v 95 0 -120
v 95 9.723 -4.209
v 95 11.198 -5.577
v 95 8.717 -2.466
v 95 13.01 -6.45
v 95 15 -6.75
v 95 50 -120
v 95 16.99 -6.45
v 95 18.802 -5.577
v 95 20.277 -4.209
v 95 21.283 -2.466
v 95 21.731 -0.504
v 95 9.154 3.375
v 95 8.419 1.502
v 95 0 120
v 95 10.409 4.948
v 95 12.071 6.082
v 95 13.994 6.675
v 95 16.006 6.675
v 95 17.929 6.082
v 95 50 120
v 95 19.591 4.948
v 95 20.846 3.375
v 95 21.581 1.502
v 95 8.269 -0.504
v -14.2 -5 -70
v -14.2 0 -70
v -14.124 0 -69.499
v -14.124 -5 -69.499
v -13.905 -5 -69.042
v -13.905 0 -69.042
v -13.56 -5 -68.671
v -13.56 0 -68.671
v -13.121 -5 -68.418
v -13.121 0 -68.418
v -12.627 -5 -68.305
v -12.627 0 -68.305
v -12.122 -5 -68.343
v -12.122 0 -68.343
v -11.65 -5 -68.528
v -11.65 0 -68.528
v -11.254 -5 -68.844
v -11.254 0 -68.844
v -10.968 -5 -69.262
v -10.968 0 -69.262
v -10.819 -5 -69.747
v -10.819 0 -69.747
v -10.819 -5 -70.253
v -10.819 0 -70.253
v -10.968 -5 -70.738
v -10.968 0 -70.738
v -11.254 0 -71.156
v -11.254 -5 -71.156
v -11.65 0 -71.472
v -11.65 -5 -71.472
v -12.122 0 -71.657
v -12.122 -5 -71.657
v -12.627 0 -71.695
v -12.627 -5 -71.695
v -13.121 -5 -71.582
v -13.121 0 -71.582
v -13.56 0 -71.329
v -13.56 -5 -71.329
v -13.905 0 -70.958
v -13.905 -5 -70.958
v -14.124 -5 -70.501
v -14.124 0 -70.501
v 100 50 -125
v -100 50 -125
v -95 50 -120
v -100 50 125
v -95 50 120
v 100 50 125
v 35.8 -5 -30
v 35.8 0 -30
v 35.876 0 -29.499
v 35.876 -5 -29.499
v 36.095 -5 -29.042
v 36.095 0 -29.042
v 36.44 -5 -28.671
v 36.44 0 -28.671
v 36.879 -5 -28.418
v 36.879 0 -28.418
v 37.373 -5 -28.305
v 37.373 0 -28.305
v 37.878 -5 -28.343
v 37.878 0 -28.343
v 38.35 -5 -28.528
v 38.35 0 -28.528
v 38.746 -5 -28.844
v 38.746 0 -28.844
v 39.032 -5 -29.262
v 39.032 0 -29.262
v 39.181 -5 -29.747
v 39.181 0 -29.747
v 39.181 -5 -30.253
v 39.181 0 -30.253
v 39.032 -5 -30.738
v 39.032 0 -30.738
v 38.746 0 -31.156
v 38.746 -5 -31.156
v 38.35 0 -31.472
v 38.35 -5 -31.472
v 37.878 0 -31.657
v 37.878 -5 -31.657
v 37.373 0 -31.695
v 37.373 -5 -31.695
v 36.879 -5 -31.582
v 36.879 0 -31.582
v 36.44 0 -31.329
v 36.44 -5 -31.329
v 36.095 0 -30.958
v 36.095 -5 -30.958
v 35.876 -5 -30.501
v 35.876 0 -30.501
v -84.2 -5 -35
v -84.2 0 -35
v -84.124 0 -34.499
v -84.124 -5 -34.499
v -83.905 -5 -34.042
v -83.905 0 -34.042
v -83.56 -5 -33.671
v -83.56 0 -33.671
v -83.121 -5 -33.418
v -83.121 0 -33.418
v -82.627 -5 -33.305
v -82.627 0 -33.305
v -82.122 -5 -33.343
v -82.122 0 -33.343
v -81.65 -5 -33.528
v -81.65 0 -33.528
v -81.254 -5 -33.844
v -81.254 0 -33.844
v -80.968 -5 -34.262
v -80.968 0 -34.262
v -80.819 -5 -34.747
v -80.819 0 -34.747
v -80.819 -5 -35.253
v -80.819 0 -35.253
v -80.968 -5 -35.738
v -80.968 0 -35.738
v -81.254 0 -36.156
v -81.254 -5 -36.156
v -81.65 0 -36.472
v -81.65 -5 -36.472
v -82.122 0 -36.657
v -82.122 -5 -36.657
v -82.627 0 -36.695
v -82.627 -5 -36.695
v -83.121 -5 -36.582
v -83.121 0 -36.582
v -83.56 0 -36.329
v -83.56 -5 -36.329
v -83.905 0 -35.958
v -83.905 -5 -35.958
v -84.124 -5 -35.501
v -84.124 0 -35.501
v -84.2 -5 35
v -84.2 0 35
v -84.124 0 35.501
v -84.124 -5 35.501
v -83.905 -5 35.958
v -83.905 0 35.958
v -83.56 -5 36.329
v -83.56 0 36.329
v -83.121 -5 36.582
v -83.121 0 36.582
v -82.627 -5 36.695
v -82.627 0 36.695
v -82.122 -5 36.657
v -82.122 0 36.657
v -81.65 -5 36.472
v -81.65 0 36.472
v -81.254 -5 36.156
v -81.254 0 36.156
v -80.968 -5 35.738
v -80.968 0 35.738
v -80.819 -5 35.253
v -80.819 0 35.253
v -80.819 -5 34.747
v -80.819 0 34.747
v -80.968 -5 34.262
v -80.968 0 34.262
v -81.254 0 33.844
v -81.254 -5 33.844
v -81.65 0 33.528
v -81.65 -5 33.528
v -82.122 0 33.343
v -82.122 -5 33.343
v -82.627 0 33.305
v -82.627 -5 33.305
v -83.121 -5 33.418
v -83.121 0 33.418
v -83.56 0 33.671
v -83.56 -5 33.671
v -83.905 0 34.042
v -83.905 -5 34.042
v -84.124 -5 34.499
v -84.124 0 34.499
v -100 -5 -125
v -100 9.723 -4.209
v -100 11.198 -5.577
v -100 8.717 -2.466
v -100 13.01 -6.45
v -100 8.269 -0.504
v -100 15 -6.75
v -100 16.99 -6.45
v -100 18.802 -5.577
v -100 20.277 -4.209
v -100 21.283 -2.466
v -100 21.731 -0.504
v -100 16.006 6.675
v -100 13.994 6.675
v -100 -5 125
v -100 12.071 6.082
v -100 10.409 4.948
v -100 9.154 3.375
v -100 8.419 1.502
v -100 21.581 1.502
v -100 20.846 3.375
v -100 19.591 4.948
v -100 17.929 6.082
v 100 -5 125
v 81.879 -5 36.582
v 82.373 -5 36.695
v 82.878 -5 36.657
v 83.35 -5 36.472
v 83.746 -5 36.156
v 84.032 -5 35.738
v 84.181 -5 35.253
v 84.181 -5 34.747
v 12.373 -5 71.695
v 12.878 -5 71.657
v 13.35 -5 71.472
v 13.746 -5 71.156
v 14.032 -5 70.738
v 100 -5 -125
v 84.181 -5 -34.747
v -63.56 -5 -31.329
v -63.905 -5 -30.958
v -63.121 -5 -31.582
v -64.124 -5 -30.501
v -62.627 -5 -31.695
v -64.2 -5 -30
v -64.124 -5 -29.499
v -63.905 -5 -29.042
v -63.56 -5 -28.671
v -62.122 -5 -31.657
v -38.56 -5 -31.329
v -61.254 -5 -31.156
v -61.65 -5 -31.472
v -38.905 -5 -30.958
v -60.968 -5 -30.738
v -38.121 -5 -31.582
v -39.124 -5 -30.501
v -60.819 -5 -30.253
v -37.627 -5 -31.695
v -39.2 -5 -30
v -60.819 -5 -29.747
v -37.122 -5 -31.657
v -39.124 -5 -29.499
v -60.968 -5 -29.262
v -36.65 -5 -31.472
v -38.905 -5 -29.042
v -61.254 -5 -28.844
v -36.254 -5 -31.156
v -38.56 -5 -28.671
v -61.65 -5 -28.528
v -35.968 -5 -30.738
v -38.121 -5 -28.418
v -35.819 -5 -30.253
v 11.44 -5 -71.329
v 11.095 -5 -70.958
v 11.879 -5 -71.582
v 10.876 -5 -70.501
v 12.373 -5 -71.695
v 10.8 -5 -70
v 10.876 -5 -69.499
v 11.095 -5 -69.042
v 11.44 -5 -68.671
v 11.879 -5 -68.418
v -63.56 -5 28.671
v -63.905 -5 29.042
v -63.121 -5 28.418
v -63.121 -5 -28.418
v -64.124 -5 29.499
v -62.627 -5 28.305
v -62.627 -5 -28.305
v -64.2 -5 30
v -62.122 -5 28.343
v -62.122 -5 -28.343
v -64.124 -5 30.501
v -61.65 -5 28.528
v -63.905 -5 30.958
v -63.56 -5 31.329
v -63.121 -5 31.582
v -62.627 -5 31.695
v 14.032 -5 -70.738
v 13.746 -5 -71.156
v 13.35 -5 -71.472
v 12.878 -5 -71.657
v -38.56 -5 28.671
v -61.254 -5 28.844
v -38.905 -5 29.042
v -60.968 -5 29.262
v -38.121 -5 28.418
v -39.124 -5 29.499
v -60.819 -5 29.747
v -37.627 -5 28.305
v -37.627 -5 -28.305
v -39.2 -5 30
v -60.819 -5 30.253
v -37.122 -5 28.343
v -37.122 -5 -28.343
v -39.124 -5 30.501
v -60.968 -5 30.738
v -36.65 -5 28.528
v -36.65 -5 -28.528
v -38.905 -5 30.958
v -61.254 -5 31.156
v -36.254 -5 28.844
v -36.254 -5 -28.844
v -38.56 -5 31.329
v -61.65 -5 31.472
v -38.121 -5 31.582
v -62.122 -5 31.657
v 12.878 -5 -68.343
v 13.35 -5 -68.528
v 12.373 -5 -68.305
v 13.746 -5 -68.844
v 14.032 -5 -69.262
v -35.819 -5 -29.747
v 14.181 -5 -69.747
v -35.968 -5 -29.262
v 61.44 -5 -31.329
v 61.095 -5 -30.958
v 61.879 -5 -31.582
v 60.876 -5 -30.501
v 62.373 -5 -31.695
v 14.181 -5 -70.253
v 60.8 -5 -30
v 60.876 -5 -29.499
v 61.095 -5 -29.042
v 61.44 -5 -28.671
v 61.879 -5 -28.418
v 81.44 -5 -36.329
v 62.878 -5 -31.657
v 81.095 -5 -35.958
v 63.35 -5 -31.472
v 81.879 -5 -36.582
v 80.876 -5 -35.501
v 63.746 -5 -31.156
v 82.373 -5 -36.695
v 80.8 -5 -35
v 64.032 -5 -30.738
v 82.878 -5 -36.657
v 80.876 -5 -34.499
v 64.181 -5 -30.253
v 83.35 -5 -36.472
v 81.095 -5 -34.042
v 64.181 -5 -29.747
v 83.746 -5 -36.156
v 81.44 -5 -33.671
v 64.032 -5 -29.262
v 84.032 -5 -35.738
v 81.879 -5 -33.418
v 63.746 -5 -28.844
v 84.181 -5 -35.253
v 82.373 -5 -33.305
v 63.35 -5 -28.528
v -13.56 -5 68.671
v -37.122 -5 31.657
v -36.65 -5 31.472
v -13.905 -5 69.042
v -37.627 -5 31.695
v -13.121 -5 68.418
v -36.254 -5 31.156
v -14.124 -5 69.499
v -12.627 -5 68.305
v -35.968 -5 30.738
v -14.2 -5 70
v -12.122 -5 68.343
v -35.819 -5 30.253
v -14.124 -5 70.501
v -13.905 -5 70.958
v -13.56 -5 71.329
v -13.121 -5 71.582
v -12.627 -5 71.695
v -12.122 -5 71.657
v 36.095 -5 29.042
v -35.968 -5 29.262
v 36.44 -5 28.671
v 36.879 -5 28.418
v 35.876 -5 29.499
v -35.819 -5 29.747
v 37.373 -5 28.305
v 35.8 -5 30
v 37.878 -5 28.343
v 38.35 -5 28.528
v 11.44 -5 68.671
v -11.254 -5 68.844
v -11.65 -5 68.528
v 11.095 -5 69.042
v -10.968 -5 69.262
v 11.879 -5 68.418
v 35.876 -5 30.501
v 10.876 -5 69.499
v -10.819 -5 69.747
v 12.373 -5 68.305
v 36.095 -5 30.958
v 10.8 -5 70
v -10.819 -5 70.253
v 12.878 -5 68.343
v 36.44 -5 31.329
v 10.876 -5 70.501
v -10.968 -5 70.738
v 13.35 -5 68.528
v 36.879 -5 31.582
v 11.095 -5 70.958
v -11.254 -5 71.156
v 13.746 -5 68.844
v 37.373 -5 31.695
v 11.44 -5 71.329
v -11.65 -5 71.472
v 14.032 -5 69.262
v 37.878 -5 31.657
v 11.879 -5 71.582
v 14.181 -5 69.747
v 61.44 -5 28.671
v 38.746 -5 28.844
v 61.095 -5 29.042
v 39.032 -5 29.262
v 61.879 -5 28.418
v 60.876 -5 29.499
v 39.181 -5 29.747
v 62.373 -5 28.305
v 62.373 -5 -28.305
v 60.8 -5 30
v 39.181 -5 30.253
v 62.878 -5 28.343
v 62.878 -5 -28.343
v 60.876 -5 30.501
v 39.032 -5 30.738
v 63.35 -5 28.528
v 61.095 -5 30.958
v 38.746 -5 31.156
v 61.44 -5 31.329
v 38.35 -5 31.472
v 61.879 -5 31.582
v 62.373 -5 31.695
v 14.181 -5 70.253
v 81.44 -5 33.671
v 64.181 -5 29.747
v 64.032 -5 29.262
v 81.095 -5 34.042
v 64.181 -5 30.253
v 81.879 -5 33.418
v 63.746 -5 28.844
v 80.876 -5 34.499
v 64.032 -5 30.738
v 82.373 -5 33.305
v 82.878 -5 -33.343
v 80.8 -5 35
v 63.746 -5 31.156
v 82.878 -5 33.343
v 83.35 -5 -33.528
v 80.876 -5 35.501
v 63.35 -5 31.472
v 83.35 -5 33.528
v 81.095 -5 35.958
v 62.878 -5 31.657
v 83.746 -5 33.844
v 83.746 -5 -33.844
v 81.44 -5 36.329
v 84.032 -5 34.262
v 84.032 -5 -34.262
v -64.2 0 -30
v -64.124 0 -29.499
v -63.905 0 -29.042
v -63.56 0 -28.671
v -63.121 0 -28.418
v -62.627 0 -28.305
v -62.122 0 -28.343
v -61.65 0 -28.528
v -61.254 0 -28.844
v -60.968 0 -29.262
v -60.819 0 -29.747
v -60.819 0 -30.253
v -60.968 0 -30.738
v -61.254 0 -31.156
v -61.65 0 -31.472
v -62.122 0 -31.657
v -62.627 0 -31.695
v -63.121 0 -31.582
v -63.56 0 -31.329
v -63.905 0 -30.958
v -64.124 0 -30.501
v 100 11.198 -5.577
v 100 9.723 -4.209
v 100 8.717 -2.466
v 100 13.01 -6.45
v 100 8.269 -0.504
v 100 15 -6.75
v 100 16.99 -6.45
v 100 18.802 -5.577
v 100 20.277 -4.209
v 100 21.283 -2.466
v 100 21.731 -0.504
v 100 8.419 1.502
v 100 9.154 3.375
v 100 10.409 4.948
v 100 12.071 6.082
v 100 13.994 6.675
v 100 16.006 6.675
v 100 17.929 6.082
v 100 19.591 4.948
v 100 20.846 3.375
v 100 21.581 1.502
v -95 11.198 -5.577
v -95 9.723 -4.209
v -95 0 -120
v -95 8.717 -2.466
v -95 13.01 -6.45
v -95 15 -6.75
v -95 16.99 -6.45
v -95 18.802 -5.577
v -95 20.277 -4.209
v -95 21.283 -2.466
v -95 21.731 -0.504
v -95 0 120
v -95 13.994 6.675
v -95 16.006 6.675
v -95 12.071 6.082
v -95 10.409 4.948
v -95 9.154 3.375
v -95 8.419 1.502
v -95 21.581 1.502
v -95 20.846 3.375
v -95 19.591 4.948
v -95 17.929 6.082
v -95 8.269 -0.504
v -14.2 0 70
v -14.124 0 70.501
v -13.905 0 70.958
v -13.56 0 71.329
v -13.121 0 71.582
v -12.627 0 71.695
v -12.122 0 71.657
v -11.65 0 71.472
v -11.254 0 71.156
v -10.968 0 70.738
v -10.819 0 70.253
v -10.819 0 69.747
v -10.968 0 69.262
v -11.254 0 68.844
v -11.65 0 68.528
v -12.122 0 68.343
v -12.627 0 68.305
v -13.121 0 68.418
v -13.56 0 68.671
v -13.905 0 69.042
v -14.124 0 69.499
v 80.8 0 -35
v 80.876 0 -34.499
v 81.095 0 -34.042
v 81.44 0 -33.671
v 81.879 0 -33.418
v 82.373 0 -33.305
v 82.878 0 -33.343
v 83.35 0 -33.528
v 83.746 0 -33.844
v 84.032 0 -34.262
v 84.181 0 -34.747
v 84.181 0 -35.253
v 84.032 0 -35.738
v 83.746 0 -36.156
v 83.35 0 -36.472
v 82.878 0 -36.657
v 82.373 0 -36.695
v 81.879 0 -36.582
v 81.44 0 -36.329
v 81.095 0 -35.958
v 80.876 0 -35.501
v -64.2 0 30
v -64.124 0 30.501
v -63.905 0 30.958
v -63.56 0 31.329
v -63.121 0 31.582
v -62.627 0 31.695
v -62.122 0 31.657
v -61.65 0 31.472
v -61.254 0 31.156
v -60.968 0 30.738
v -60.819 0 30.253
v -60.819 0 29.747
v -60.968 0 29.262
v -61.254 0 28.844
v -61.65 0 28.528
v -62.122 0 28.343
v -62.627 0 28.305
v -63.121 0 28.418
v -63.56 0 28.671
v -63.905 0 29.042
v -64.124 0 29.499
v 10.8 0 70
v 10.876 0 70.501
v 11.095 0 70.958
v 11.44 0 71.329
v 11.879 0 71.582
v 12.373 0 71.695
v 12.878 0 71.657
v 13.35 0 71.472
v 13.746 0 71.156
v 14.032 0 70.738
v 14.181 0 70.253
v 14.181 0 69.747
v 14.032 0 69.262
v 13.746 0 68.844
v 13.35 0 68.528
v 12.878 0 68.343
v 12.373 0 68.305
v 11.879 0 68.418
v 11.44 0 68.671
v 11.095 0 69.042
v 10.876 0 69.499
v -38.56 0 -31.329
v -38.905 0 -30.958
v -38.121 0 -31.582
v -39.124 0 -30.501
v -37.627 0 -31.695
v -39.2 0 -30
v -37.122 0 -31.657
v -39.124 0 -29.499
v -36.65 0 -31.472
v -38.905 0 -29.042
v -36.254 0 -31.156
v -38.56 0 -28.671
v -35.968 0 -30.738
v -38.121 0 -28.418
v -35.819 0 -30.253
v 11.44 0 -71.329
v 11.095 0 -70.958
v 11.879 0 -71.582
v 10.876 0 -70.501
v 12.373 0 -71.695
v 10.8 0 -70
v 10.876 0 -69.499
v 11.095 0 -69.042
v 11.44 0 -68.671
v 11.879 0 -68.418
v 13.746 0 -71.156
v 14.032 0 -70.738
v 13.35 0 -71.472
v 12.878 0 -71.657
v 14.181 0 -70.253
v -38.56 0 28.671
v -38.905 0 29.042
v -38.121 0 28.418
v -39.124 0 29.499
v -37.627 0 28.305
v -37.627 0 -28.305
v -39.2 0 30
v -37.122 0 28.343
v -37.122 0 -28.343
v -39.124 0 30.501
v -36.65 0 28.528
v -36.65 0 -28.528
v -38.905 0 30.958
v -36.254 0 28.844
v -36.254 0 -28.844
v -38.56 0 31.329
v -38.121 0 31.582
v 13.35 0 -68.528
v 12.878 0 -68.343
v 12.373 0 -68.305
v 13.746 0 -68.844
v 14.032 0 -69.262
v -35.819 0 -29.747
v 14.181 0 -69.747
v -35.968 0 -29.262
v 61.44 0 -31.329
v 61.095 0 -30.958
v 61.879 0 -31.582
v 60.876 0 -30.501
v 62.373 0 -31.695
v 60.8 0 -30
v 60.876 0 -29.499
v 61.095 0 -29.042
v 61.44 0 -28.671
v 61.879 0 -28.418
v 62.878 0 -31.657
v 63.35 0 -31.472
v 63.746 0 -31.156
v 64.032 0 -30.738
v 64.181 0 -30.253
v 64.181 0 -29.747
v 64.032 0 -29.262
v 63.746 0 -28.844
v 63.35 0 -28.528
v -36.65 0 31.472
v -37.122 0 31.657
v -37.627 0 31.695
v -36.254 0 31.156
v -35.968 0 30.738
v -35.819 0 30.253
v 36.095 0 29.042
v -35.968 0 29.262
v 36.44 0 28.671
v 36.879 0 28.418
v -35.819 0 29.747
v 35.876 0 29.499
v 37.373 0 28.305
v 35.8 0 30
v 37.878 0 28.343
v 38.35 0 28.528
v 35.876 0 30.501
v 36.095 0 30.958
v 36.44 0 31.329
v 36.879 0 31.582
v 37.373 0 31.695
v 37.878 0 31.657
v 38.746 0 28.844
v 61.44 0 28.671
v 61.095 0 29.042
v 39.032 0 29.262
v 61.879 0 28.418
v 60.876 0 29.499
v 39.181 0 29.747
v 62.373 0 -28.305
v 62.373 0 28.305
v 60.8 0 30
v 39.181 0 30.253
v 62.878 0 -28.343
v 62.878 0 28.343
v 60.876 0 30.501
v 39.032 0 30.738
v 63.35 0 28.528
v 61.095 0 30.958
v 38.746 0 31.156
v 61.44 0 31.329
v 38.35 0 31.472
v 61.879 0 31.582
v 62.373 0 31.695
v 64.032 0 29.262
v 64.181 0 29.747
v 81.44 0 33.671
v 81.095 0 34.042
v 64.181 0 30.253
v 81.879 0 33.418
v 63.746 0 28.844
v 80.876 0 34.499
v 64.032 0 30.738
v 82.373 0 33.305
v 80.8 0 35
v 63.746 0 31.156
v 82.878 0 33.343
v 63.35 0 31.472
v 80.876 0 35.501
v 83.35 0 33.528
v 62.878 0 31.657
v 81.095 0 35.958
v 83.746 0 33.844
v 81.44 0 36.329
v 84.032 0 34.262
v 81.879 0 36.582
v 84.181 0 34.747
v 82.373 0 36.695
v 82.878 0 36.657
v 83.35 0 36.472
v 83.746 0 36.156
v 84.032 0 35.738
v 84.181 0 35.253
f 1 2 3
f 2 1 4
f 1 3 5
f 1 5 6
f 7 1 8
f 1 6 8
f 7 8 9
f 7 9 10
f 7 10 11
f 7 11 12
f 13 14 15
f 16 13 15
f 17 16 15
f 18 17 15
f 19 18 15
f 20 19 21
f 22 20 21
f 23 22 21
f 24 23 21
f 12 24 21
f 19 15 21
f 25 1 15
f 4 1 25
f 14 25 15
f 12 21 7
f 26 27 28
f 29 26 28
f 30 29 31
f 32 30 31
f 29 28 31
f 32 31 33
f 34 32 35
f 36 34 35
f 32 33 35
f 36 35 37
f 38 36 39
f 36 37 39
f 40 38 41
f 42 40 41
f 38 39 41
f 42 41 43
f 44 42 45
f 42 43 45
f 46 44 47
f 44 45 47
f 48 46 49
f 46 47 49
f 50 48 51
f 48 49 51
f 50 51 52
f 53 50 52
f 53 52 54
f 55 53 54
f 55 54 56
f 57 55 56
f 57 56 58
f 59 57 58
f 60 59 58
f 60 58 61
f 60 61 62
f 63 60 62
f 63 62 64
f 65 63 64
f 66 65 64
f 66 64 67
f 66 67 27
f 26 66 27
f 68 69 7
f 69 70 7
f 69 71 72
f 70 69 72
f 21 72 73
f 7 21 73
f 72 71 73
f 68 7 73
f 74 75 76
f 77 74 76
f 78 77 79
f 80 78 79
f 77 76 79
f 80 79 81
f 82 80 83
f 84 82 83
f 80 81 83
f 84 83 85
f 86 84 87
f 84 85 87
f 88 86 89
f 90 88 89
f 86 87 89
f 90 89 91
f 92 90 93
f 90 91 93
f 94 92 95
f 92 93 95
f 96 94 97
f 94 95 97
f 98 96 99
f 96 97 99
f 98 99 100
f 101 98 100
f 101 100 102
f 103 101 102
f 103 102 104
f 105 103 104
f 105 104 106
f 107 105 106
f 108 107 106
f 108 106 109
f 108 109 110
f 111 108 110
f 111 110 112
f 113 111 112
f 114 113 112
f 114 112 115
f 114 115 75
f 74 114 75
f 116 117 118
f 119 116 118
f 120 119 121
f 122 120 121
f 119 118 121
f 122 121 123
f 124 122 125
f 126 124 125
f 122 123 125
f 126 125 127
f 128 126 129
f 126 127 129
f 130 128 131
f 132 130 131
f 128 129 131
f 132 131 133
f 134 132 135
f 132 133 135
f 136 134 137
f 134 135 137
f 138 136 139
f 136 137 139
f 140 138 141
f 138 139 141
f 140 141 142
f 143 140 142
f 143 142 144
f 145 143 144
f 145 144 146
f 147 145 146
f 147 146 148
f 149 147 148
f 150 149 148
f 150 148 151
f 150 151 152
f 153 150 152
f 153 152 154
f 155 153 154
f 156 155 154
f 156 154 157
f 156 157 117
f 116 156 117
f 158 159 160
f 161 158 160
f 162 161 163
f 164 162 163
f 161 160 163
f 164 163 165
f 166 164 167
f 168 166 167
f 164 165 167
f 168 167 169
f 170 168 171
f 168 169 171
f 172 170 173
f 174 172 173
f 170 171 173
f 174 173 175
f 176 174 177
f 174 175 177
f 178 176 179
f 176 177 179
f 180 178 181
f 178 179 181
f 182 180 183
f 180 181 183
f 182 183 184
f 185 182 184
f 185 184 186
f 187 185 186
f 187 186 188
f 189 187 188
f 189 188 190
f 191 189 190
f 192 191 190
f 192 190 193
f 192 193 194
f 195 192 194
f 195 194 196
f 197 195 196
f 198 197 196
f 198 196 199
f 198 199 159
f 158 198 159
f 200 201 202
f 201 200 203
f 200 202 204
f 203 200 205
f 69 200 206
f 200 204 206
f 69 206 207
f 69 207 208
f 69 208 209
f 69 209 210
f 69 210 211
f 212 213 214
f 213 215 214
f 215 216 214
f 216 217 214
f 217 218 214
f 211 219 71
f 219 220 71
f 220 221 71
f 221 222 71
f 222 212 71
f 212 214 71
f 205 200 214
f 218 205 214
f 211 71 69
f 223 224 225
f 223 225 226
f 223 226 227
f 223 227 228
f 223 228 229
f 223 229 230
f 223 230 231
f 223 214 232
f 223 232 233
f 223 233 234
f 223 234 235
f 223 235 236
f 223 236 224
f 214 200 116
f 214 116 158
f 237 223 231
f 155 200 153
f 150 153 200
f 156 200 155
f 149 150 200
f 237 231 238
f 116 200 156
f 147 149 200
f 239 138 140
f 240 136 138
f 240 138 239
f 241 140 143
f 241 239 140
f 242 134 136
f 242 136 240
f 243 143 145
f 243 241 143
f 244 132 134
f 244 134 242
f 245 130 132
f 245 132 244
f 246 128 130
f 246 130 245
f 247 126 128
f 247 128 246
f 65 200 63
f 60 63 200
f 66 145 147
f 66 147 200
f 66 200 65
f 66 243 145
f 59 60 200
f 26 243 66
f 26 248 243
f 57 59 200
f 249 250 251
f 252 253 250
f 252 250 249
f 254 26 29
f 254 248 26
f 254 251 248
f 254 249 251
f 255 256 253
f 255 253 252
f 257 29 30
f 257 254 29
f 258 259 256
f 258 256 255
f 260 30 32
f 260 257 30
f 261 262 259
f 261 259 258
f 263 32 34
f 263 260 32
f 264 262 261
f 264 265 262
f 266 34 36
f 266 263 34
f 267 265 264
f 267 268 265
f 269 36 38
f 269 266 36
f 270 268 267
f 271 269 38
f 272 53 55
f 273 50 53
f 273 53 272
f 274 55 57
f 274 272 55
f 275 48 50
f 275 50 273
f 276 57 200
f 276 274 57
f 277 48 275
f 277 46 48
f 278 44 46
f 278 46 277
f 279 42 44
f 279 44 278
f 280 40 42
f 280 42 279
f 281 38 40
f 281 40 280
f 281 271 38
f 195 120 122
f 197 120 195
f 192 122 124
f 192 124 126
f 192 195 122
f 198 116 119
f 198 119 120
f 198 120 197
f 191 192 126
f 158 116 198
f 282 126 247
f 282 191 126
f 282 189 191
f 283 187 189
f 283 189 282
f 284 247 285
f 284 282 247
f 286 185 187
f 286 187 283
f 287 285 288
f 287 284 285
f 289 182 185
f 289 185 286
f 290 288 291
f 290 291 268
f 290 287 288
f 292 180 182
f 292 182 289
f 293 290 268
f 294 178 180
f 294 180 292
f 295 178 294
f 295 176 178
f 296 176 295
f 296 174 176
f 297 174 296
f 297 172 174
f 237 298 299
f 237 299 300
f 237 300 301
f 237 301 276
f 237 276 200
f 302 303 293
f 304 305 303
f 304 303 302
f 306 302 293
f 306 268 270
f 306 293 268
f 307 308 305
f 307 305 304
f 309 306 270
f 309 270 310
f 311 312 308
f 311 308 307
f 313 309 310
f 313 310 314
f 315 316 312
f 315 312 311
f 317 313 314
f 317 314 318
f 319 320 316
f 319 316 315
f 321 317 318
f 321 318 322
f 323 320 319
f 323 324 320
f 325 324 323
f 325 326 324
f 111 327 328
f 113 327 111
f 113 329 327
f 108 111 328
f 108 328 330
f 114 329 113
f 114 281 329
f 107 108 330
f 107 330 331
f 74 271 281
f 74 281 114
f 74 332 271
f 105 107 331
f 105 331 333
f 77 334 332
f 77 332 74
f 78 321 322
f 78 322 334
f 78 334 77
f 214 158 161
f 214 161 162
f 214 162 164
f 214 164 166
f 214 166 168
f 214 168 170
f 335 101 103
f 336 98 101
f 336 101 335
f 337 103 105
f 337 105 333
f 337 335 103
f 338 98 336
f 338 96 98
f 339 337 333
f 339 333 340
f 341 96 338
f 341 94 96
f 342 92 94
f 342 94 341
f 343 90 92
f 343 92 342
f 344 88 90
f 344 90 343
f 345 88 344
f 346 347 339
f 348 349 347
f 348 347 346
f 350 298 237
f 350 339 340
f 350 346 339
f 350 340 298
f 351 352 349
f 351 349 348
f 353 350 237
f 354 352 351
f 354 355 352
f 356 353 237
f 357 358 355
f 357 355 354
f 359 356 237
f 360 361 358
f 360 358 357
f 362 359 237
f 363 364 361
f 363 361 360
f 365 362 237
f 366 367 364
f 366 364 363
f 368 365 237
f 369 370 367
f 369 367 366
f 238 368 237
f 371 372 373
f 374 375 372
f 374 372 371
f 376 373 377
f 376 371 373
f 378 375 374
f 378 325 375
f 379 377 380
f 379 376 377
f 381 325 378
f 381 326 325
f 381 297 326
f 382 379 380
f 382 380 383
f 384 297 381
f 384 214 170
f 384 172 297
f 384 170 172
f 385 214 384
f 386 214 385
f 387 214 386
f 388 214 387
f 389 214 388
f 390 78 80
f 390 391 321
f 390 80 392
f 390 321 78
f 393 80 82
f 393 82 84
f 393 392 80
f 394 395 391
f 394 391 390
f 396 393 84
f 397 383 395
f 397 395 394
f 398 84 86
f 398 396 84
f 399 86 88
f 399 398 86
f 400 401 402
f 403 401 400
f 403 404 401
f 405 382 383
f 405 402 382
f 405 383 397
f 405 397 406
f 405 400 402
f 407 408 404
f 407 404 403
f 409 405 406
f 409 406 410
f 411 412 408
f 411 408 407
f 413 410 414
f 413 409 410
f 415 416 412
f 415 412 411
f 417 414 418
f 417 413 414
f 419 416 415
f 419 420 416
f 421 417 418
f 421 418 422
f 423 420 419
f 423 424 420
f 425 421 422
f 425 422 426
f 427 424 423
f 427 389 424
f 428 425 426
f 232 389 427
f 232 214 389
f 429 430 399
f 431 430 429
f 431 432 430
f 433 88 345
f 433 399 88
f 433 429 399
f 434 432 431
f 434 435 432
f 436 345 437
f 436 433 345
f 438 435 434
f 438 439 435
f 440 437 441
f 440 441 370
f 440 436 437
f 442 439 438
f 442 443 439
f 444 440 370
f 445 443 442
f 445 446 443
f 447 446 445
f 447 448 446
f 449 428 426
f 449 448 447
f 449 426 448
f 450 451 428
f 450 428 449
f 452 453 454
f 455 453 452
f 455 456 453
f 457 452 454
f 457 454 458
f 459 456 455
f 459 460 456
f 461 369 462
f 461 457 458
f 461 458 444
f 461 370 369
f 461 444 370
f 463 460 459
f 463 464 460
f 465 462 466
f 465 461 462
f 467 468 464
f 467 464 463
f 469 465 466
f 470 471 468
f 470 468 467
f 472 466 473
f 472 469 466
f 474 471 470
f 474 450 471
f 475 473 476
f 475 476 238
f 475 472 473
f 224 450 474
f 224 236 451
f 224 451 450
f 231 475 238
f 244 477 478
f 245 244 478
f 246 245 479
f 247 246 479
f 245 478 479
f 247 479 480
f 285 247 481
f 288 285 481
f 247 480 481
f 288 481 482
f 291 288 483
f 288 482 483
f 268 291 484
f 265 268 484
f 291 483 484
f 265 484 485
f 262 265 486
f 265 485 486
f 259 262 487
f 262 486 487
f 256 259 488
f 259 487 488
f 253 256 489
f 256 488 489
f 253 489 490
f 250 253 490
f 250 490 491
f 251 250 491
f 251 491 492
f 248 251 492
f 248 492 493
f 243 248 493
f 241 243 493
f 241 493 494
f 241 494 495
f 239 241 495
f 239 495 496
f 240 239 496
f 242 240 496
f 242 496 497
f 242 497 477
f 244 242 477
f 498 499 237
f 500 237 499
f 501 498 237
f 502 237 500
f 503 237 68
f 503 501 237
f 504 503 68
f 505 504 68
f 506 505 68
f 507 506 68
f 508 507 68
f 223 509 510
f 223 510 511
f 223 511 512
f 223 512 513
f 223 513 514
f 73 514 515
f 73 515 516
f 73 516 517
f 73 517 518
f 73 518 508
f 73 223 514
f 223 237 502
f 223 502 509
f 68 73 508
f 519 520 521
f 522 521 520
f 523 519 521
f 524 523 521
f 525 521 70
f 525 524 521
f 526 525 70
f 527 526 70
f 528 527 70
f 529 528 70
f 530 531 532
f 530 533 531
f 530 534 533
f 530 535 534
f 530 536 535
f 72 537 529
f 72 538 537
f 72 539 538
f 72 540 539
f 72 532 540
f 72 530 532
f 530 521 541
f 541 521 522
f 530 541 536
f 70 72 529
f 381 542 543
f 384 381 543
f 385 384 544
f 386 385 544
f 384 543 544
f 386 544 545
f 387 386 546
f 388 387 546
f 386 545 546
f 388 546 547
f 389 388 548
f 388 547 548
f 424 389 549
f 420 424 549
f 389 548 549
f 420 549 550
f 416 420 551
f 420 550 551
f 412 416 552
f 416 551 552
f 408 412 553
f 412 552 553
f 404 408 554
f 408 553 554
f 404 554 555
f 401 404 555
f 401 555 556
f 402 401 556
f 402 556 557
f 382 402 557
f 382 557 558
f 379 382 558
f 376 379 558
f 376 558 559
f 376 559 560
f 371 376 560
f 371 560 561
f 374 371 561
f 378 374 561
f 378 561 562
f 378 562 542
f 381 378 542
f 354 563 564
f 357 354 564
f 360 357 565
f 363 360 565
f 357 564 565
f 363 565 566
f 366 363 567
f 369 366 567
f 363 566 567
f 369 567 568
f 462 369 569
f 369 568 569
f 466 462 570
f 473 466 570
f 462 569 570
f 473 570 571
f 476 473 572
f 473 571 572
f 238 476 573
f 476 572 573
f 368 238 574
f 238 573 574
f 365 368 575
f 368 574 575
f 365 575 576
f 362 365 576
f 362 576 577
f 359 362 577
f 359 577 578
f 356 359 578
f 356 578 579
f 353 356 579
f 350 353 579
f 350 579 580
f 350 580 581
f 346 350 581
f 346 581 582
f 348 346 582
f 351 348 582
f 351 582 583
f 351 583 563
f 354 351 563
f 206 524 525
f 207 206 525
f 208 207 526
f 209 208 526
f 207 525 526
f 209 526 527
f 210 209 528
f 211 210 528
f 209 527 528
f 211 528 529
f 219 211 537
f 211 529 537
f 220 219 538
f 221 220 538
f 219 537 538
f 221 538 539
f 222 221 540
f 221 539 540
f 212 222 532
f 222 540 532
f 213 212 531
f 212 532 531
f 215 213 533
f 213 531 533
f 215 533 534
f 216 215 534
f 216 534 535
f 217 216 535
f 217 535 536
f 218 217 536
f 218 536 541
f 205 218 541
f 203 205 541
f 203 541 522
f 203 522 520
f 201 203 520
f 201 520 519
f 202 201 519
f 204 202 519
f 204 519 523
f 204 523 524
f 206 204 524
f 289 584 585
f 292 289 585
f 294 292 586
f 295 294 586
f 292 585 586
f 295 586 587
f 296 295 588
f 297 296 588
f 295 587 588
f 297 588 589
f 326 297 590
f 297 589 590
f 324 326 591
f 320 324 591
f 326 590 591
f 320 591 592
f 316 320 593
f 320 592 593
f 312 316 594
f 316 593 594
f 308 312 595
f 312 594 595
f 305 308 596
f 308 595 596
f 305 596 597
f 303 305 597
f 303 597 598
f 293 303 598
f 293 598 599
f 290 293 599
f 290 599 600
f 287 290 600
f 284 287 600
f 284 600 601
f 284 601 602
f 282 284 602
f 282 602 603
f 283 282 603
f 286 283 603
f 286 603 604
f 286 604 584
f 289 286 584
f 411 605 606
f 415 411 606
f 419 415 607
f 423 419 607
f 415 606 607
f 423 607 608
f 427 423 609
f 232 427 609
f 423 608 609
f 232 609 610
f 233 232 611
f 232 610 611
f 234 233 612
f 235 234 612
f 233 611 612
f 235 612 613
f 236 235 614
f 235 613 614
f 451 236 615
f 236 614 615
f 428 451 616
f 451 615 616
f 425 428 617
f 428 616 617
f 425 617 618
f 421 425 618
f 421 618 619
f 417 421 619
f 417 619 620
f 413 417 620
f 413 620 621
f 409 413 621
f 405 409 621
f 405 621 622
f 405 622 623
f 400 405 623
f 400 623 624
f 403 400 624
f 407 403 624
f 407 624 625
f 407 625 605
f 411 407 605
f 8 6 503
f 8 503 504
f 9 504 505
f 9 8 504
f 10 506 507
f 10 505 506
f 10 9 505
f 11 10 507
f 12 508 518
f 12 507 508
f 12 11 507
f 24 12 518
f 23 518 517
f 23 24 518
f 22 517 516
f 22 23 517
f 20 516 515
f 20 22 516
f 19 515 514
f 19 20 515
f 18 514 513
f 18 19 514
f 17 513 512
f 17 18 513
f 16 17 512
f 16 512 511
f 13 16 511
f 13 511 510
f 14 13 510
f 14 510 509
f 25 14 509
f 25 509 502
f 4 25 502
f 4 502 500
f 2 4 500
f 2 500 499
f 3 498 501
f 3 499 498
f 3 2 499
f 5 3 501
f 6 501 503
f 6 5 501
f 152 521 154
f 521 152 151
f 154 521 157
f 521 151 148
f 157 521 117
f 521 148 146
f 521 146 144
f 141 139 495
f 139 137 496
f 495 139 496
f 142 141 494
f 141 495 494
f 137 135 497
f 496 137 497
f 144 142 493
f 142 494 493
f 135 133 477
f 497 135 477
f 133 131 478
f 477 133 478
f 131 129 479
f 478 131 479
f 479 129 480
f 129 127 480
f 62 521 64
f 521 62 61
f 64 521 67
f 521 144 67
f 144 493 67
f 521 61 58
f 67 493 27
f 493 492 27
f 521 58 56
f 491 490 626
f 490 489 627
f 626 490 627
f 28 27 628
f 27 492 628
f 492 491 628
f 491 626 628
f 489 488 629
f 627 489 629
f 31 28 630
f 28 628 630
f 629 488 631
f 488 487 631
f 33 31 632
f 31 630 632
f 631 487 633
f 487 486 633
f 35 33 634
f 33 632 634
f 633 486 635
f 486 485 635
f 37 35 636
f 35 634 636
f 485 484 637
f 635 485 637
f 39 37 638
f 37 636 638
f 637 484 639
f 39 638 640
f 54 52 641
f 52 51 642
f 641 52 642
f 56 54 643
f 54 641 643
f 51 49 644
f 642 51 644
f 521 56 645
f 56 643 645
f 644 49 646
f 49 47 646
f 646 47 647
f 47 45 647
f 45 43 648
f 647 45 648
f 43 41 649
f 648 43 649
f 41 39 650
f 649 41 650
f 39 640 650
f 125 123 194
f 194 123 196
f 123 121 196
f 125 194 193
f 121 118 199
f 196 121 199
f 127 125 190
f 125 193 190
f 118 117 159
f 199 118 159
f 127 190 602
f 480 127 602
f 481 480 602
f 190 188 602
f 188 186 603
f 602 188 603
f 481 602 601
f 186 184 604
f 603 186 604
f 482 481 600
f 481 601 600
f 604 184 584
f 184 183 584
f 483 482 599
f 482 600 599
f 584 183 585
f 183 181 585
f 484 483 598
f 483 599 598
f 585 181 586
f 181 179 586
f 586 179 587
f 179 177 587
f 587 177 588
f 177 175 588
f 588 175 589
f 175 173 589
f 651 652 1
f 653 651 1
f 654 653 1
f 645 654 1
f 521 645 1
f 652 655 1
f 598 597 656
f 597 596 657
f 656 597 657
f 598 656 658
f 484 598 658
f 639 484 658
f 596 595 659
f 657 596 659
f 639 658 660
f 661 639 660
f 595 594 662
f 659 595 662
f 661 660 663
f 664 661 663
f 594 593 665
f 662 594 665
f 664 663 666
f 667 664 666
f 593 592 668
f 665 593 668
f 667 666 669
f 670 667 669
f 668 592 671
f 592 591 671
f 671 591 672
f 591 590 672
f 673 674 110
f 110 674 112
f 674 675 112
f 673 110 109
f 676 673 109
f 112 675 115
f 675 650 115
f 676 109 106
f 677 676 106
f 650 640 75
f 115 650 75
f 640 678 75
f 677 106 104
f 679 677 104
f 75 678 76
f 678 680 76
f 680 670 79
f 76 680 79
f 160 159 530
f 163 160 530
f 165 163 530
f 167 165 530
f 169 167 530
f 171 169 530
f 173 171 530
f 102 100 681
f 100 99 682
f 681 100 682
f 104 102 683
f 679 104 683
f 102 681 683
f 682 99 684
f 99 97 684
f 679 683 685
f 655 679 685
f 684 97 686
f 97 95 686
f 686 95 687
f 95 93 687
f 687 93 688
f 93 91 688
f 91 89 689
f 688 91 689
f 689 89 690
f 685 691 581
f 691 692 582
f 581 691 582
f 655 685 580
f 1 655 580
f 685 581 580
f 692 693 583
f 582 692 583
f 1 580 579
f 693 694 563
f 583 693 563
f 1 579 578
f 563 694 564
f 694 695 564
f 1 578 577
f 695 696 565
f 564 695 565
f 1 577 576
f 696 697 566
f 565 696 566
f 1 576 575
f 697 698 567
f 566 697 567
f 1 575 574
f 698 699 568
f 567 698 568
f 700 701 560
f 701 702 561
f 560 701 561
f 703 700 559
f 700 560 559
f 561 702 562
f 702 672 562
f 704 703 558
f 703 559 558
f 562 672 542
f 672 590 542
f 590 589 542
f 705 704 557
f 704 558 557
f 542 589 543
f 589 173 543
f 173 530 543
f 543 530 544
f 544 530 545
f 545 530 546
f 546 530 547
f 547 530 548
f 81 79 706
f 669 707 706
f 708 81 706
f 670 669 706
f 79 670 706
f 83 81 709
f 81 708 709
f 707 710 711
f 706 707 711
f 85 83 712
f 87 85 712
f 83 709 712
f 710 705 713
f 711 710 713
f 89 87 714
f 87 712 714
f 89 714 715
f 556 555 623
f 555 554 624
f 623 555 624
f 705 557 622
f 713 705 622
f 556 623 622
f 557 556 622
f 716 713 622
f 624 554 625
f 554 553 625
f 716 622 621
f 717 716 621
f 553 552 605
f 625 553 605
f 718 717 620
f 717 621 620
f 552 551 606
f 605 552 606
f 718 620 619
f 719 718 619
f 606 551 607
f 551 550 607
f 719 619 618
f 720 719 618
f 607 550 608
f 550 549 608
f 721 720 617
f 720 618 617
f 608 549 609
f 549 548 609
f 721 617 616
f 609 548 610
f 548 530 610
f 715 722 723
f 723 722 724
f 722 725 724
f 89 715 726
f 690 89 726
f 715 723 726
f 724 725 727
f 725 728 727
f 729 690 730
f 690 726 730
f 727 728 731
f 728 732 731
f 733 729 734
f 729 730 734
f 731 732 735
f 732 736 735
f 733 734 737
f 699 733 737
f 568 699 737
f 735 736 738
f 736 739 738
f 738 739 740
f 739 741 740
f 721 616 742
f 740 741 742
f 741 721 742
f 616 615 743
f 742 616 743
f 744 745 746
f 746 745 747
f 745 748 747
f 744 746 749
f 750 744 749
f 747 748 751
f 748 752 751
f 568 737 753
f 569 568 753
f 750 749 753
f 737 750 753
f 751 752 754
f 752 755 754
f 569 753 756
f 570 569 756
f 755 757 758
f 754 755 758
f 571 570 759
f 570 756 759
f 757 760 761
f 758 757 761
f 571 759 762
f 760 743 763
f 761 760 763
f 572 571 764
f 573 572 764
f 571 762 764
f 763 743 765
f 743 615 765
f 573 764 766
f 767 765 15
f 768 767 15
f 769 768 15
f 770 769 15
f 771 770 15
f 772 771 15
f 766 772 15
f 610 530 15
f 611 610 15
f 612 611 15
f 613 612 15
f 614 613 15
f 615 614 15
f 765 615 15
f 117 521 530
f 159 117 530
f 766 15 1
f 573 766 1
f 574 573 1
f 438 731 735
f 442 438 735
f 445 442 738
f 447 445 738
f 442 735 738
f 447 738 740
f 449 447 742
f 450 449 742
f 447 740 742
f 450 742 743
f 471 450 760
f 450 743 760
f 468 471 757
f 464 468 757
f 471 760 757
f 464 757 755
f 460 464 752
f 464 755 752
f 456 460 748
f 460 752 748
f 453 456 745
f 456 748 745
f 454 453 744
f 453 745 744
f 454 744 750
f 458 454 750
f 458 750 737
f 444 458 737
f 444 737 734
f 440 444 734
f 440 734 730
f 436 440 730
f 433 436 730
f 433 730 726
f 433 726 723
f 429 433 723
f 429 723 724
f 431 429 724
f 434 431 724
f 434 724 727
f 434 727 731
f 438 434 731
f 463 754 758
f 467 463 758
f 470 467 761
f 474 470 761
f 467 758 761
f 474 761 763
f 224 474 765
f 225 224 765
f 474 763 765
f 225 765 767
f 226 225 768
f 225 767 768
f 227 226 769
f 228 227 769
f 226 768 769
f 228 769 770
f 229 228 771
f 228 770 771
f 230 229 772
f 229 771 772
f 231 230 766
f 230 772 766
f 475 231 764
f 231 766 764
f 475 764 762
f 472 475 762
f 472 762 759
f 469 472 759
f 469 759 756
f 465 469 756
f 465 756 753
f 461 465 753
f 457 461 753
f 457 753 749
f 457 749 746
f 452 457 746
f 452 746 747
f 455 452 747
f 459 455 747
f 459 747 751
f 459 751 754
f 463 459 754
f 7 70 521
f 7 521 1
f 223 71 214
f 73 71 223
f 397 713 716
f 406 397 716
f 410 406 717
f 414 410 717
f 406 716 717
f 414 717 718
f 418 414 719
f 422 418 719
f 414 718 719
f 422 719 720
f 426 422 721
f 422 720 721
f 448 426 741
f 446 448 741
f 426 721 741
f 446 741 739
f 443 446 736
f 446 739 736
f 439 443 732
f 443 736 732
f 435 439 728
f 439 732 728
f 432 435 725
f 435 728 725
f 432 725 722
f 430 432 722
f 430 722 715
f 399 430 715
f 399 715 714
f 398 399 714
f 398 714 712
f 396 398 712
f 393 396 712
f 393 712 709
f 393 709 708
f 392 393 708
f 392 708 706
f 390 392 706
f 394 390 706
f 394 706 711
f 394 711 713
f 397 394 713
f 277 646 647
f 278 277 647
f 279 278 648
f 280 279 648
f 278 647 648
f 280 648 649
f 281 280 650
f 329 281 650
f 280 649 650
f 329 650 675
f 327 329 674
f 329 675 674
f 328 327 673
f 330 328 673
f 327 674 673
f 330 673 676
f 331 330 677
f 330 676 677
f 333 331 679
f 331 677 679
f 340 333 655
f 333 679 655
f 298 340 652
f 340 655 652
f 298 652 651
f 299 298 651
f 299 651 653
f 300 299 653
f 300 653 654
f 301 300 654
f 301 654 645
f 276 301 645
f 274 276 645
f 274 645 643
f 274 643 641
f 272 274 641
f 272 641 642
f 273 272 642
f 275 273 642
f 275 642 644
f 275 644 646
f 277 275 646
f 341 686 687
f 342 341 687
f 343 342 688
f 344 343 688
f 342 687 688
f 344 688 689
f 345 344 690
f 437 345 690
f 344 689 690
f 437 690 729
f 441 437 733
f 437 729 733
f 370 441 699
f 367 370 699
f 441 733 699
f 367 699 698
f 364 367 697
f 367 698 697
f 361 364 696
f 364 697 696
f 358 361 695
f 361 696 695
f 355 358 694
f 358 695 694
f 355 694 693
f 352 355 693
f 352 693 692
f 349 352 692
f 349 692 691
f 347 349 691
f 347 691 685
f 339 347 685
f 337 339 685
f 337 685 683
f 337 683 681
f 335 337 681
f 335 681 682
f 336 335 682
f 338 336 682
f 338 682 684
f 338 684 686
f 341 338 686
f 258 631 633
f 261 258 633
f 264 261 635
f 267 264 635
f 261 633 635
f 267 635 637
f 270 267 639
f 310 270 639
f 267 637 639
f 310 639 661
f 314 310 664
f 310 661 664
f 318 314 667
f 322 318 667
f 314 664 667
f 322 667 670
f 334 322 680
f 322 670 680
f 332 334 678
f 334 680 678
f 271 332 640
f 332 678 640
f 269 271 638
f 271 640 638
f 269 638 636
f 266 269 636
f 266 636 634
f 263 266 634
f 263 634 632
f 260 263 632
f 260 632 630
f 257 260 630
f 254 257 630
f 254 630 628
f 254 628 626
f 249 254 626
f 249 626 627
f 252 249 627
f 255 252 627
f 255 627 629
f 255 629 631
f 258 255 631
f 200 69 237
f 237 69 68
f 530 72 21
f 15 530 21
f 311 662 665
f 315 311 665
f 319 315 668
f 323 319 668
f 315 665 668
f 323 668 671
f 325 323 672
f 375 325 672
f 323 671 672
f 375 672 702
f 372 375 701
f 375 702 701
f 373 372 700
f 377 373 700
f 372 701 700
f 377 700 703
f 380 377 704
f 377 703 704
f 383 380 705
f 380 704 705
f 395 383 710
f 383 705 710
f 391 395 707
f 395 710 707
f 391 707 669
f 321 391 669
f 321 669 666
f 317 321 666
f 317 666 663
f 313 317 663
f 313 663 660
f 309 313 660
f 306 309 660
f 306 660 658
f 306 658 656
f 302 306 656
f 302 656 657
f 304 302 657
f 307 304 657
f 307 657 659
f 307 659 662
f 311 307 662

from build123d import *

# Parameters (mm, degrees)
SKETCH1_W               = 190
SKETCH1_H               = 50
BOSS_EXTRUDE1_DEPTH     = 120
SHELL1_T                = 5
SKETCH2_R               = 1.7
CUT_EXTRUDE1_DEPTH      = 168.705098312
CUT_EXTRUDE1_DEPTH_BACK = 168.705098312
SKETCH3_R               = 6.75
CUT_EXTRUDE2_DEPTH      = 168.705098312
CUT_EXTRUDE2_DEPTH_BACK = 168.705098312


with BuildPart() as part:
    # Sketch1 → Boss-Extrude1 (new, symmetric)
    with BuildSketch(Plane.XY):
        with Locations((0, 25)):
            Rectangle(SKETCH1_W, SKETCH1_H)
    extrude(amount=BOSS_EXTRUDE1_DEPTH, both=True)

    # Shell1
    shell1_openings = [part.faces().sort_by_distance(p)[0] for p in [
        (0, 50, 0),
    ]]
    offset(amount=SHELL1_T, openings=shell1_openings, kind=Kind.INTERSECTION)

    # Sketch2 → Cut-Extrude1 (cut, two sides)
    with BuildSketch(Plane(origin=(0, 0, 0), x_dir=(1, 0, 0), z_dir=(0, 1, 0))) as cut_extrude1_sk:
        with Locations(Location((-12.5, 70, 0), (0, 0, 180))):
            Circle(SKETCH2_R)
        with Locations(Location((-37.5, 30, 0), (0, 0, 180))):
            Circle(SKETCH2_R)
        with Locations(Location((-62.5, 30, 0), (0, 0, 180))):
            Circle(SKETCH2_R)
        with Locations(Location((-82.5, 35, 0), (0, 0, 180))):
            Circle(SKETCH2_R)
        with Locations(Location((82.5, 35, 0), (0, 0, 180))):
            Circle(SKETCH2_R)
        with Locations(Location((62.5, 30, 0), (0, 0, 180))):
            Circle(SKETCH2_R)
        with Locations(Location((37.5, 30, 0), (0, 0, 180))):
            Circle(SKETCH2_R)
        with Locations(Location((12.5, 70, 0), (0, 0, 180))):
            Circle(SKETCH2_R)
        with Locations(Location((12.5, -70, 0), (0, 0, 180))):
            Circle(SKETCH2_R)
        with Locations(Location((37.5, -30, 0), (0, 0, 180))):
            Circle(SKETCH2_R)
        with Locations(Location((62.5, -30, 0), (0, 0, 180))):
            Circle(SKETCH2_R)
        with Locations(Location((82.5, -35, 0), (0, 0, 180))):
            Circle(SKETCH2_R)
        with Locations(Location((-82.5, -35, 0), (0, 0, 180))):
            Circle(SKETCH2_R)
        with Locations(Location((-62.5, -30, 0), (0, 0, 180))):
            Circle(SKETCH2_R)
        with Locations(Location((-37.5, -30, 0), (0, 0, 180))):
            Circle(SKETCH2_R)
        with Locations(Location((-12.5, -70, 0), (0, 0, 180))):
            Circle(SKETCH2_R)
    extrude(amount=CUT_EXTRUDE1_DEPTH, mode=Mode.SUBTRACT)
    extrude(cut_extrude1_sk.sketch, amount=-CUT_EXTRUDE1_DEPTH_BACK, mode=Mode.SUBTRACT)

    # Sketch3 → Cut-Extrude2 (cut, two sides)
    with BuildSketch(Plane(origin=(0, 0, 0), x_dir=(0, 0, -1), z_dir=(1, 0, 0))) as cut_extrude2_sk:
        with Locations((0, 15)):
            Circle(SKETCH3_R)
    extrude(amount=CUT_EXTRUDE2_DEPTH, mode=Mode.SUBTRACT)
    extrude(cut_extrude2_sk.sketch, amount=-CUT_EXTRUDE2_DEPTH_BACK, mode=Mode.SUBTRACT)


solid = part.part
